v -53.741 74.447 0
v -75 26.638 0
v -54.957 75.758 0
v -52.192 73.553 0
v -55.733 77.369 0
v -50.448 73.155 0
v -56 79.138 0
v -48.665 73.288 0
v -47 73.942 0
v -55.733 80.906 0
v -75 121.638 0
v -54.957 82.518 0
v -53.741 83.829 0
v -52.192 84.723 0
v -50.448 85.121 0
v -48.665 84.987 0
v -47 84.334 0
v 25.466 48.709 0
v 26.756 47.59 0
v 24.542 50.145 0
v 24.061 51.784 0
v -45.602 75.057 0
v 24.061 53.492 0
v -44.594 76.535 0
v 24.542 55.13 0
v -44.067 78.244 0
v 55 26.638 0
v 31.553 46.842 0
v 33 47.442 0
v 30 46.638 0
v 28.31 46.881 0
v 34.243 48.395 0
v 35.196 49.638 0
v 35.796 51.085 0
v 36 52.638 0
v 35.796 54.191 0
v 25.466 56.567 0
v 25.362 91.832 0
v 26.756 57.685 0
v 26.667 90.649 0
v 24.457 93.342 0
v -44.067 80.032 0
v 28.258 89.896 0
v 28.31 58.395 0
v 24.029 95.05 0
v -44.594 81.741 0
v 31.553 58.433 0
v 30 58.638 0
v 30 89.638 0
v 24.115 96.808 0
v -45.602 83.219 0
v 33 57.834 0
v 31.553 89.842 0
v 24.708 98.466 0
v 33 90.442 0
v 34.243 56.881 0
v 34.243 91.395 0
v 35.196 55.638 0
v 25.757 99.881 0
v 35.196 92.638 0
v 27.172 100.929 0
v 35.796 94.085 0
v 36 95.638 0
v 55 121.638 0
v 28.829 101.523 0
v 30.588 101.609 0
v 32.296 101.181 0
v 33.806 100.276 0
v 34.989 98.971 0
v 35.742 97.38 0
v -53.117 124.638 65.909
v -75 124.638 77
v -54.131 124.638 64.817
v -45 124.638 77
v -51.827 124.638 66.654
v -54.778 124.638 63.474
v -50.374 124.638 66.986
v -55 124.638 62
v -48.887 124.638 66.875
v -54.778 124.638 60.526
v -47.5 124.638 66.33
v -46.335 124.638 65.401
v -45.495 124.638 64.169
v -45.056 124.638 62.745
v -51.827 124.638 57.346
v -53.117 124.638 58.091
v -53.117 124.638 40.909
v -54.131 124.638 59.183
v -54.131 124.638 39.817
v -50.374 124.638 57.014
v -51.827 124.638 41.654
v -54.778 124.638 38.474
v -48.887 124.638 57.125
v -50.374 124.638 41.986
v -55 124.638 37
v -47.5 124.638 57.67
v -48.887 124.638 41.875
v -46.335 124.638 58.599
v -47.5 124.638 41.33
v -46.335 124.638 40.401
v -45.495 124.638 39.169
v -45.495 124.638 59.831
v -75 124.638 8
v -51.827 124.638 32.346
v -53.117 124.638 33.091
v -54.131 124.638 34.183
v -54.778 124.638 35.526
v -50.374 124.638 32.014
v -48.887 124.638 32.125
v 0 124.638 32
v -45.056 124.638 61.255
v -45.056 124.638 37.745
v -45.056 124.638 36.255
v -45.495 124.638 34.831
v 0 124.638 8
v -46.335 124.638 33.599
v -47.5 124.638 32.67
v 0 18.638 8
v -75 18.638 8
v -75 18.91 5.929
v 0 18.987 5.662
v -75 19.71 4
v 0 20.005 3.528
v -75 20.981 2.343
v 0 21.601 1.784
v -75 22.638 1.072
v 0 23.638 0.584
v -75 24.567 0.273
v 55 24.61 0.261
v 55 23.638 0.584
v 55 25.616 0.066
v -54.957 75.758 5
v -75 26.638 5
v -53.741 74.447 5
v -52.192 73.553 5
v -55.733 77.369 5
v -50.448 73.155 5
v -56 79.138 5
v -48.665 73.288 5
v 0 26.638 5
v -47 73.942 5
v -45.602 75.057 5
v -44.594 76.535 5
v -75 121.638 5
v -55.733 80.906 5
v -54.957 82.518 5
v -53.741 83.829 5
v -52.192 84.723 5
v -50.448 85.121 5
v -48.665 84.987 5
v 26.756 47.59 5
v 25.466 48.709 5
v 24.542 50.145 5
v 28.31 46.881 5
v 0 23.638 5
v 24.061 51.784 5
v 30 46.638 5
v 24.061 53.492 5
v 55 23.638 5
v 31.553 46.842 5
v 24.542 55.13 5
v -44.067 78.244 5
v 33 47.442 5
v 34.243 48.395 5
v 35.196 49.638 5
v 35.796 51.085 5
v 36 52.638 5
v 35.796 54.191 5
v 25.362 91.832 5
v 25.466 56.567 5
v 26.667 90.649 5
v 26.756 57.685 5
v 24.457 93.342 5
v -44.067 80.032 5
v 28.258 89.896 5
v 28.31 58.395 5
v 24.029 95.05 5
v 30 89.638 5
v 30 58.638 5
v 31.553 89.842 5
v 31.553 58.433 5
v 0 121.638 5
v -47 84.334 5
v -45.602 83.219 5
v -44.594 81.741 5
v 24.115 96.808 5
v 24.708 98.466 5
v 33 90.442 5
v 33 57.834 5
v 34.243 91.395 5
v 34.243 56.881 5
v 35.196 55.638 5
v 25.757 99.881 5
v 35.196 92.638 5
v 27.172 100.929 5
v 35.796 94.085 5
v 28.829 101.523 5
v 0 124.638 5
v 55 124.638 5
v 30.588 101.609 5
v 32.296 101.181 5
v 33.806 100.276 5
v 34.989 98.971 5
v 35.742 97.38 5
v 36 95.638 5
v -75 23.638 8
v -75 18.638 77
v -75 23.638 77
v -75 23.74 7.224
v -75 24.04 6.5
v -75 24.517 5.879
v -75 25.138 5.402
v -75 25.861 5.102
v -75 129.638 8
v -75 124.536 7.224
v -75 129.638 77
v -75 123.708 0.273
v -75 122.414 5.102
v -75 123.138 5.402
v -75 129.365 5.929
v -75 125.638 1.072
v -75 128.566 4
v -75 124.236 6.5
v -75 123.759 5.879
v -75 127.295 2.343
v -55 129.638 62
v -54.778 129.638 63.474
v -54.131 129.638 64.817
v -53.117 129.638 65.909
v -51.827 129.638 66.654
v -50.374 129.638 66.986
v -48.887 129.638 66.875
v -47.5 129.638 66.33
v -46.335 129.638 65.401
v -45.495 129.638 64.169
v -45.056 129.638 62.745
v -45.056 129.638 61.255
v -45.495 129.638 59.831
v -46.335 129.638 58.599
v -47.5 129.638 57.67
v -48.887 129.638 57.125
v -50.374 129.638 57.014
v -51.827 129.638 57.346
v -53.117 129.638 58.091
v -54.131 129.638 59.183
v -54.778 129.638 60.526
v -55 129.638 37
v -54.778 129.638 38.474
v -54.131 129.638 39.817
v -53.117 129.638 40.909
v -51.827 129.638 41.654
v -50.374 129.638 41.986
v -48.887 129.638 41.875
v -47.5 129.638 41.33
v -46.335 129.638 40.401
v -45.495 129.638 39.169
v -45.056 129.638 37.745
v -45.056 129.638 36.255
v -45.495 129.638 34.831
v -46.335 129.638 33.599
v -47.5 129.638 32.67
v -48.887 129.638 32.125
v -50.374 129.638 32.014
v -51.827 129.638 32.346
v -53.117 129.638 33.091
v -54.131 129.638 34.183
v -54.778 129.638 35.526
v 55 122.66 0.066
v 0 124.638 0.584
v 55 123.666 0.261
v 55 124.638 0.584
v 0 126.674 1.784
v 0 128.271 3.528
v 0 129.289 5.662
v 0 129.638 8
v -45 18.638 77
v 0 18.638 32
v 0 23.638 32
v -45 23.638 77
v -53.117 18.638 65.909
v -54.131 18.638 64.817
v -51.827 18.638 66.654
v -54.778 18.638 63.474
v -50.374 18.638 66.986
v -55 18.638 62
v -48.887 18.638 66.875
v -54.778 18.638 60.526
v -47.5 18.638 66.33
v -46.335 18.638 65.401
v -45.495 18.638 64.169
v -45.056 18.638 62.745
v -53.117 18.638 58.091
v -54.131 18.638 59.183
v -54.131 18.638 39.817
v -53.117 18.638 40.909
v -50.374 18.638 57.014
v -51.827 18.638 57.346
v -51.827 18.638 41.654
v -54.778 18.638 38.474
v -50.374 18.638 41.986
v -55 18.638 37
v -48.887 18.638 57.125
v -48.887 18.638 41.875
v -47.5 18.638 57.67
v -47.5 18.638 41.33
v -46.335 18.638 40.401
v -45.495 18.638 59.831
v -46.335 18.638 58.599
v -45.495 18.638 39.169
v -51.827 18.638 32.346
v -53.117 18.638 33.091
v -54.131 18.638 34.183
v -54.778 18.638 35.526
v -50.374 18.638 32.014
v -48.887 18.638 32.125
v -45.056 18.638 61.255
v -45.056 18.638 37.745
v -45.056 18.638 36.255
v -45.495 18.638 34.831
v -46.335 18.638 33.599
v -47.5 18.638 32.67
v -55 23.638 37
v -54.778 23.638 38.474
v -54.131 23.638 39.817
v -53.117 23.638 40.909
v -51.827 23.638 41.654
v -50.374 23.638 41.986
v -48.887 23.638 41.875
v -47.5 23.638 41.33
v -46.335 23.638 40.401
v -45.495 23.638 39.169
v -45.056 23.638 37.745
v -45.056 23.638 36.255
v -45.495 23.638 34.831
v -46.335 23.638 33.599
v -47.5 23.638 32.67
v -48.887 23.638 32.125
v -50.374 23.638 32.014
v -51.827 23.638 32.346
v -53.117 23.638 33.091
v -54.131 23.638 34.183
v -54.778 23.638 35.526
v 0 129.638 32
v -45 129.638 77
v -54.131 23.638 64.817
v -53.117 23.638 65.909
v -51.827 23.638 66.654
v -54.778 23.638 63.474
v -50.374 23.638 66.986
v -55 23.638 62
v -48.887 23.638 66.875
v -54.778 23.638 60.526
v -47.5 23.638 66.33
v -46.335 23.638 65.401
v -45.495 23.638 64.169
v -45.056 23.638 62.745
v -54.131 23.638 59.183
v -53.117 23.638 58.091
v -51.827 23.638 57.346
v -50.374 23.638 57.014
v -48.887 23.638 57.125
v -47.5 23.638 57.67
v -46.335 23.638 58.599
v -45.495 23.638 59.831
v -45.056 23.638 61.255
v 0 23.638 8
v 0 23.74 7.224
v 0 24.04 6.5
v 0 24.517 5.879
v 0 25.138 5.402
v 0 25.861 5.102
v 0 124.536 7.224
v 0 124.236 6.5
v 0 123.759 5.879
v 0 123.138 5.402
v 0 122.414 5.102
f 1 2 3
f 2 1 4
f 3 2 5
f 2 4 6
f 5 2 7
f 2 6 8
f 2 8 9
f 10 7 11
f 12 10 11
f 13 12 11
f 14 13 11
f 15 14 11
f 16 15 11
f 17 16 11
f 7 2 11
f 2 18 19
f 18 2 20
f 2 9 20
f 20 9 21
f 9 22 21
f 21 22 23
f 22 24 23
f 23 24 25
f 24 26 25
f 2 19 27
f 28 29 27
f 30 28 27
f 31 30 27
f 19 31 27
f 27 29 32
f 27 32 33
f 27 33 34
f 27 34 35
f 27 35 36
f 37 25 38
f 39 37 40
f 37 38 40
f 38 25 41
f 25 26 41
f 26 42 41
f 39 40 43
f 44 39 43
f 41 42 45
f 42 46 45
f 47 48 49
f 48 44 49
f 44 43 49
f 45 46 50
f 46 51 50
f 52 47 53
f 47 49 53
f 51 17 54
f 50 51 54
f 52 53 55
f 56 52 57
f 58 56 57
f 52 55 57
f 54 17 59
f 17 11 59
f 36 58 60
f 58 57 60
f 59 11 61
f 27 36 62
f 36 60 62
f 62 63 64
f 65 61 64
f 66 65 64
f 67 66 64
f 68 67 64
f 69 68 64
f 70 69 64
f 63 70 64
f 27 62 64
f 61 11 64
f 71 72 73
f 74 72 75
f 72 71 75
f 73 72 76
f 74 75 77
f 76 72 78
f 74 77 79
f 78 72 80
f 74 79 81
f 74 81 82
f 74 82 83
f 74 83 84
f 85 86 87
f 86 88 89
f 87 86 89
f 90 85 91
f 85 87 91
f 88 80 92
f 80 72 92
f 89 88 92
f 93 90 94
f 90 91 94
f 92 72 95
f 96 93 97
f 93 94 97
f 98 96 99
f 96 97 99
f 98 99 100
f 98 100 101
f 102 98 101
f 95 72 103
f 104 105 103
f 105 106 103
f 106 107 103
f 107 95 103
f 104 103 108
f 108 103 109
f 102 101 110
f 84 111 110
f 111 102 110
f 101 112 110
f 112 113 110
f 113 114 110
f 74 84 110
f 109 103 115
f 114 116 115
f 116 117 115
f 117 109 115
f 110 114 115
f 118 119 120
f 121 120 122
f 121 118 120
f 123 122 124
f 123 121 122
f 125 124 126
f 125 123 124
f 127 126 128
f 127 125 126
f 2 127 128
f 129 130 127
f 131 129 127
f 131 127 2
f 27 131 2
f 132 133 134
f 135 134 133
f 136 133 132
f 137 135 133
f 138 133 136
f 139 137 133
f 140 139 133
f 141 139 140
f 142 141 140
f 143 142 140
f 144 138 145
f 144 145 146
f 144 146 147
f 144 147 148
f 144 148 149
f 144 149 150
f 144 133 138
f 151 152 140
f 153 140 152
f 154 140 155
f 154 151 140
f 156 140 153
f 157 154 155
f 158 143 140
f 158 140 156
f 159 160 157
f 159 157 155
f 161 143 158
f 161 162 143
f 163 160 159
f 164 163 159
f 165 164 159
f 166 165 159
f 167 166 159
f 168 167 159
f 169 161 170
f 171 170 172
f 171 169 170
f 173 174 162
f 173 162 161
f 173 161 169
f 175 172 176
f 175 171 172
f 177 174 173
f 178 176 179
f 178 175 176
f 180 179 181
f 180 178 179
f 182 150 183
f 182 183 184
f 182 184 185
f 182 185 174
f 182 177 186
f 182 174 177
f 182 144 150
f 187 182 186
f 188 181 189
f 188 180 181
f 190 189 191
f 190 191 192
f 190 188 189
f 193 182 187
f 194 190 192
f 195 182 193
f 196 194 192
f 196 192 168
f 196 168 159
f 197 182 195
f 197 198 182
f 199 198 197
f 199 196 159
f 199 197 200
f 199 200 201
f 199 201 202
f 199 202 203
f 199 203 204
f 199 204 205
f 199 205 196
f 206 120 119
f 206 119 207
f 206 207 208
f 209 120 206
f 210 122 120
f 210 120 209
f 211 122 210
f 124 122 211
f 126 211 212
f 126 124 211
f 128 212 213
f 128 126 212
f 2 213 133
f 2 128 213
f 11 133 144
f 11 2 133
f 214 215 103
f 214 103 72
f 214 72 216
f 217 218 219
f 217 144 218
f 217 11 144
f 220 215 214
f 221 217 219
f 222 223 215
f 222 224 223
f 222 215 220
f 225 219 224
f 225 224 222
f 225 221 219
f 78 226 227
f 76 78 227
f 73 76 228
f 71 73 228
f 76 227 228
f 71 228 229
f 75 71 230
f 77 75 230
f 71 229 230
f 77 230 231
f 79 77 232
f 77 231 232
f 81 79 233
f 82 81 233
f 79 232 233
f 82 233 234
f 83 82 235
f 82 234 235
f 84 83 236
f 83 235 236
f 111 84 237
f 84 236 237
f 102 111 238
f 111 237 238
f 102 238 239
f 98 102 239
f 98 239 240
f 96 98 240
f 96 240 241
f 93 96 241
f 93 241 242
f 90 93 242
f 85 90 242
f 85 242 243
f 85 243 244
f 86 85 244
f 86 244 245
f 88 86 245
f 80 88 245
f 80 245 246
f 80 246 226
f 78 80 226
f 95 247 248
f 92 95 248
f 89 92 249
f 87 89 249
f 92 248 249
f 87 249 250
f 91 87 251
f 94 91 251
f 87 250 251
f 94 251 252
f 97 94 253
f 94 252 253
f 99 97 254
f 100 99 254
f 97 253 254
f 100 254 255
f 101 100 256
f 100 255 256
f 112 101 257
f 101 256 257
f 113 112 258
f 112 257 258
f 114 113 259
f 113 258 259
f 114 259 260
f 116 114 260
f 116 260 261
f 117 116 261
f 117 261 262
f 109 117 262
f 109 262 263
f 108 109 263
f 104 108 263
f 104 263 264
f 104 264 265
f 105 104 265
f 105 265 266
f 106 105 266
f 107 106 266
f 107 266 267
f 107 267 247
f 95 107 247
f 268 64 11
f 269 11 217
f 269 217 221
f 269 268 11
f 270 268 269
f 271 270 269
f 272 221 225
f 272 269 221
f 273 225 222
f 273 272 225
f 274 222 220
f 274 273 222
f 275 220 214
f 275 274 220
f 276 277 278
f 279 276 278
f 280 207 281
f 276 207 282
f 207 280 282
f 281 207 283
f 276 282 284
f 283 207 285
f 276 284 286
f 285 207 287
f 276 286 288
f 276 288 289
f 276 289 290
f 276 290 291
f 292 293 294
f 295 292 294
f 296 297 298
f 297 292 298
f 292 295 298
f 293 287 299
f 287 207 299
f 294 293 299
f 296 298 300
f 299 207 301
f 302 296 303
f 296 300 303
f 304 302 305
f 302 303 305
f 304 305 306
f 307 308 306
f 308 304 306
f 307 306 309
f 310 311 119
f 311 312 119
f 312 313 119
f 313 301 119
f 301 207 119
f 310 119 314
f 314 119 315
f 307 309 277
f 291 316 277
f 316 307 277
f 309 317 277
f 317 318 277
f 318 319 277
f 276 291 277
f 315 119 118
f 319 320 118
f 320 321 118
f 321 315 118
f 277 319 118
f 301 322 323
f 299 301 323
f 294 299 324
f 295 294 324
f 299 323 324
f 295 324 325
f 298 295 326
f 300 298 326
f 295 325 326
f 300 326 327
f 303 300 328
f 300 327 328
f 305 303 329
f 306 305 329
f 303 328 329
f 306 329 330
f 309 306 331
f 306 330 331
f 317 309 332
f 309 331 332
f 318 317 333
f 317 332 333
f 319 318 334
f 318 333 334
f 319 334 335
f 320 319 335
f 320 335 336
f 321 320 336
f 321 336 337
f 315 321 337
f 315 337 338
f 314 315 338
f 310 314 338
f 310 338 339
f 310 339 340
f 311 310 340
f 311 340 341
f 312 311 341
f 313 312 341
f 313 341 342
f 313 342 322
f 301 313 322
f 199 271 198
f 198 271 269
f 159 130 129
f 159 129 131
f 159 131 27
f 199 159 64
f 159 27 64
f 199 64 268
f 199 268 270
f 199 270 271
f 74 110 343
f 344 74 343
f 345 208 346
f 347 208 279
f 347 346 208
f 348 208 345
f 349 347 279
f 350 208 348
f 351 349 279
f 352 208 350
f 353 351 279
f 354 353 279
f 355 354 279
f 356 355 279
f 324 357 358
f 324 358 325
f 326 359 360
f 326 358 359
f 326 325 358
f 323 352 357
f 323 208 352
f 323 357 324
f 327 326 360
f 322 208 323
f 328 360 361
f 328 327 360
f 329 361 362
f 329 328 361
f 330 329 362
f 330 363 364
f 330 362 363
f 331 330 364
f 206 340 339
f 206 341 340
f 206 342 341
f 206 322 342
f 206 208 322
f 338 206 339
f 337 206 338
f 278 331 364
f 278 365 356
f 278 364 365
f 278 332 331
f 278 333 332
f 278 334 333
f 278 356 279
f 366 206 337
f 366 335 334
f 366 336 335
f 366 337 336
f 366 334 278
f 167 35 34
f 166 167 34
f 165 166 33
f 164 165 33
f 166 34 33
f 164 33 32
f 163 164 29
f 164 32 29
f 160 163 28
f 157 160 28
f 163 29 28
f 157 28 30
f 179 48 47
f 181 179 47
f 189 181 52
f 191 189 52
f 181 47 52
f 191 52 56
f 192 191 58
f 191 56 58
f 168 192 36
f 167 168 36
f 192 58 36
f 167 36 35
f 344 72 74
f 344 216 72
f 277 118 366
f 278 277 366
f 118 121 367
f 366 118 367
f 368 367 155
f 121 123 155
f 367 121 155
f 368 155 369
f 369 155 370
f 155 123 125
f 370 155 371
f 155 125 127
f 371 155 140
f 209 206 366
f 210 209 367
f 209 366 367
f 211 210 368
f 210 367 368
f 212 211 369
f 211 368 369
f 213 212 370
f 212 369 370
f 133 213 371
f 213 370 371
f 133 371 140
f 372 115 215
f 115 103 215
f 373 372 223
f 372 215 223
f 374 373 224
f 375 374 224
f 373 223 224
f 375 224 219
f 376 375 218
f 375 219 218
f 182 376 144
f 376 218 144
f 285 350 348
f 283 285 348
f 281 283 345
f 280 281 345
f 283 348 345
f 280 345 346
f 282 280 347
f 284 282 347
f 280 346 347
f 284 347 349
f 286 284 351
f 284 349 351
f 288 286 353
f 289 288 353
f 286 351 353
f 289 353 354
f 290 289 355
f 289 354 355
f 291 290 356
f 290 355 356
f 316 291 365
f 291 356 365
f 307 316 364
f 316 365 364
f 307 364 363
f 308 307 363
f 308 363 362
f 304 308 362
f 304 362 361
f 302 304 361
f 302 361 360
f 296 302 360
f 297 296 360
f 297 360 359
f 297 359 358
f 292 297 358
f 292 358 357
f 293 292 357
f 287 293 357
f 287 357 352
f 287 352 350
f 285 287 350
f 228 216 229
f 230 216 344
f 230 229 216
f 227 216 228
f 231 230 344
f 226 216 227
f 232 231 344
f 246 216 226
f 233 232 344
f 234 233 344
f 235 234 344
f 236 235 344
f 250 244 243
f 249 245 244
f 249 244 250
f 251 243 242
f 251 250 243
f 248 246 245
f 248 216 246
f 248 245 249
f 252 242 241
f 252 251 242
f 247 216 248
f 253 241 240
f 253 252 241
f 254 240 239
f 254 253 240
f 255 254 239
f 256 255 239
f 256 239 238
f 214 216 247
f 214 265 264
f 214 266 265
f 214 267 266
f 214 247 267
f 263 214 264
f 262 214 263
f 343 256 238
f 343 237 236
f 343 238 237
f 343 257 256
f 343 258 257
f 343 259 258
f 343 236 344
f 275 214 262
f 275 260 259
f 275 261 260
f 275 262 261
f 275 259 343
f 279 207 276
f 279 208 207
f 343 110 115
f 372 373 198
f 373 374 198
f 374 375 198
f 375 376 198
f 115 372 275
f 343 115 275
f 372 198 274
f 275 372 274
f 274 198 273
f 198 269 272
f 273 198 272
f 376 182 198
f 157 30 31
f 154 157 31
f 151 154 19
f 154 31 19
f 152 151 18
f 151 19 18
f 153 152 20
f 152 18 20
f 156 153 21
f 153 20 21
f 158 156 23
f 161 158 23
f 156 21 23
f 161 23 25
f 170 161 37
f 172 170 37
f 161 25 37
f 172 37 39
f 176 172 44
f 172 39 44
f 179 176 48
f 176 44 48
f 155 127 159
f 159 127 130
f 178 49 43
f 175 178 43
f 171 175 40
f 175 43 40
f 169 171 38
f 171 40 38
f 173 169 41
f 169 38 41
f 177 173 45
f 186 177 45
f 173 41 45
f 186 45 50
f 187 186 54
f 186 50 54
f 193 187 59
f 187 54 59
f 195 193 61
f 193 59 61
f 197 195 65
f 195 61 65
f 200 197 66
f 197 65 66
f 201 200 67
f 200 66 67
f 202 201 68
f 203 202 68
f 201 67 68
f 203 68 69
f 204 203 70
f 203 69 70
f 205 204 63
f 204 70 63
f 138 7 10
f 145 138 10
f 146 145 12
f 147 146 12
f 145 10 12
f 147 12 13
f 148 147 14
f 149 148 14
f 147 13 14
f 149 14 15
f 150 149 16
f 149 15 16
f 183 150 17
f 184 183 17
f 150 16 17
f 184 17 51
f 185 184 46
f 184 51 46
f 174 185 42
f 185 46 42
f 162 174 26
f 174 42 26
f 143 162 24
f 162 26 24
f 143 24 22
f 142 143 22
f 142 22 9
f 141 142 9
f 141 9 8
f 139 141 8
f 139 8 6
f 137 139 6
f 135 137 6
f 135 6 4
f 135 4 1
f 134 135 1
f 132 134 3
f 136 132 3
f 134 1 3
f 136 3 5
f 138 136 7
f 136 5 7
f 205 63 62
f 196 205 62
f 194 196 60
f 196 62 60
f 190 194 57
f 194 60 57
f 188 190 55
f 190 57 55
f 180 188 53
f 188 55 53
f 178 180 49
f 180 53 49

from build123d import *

# Parameters (mm, degrees)
F1_DEPTH = 5
F0_W     = 75
F0_H     = 5
F2_DEPTH = 77
F3_SIZE  = 45
F4_SIZE  = 45
F5_R     = 3
F6_R     = 8
F8_D     = 10
F9_D     = 10


with BuildPart() as f1:
    # F0 (on Top) → F1 (new body)
    with BuildSketch(Plane.XY):
        Polygon((30, 23.6378825456), (55, 23.6378825456), (55, 124.6378825456), (0, 124.6378825456), (-75, 124.6378825456), (-75, 79.1378825456), (-75, 23.6378825456), (0, 23.6378825456), align=None)
        with BuildLine():
            ThreePointArc((36, 52.6378825456), (34.2426406871, 48.3952418585), (30, 46.6378825456))
            ThreePointArc((30, 46.6378825456), (24, 52.6378825456), (30, 58.6378825456))
            ThreePointArc((30, 58.6378825456), (34.2426406871, 56.8805232327), (36, 52.6378825456))
        make_face(mode=Mode.SUBTRACT)
        with BuildLine():
            ThreePointArc((-44, 79.1378825456), (-50, 73.1378825456), (-56, 79.1378825456))
            ThreePointArc((-56, 79.1378825456), (-50, 85.1378825456), (-44, 79.1378825456))
        make_face(mode=Mode.SUBTRACT)
        with BuildLine():
            ThreePointArc((36, 95.6378825456), (34.2426406871, 91.3952418585), (30, 89.6378825456))
            ThreePointArc((30, 89.6378825456), (25.7573593129, 99.8805232327), (36, 95.6378825456))
        make_face(mode=Mode.SUBTRACT)
    extrude(amount=F1_DEPTH)

    # F0 (on Top) → F2 (join)
    with BuildSketch(Plane.XY):
        with Locations((-37.5, 127.1378825456)):
            Rectangle(F0_W, F0_H)
        with Locations((-37.5, 21.1378825456)):
            Rectangle(F0_W, F0_H)
    extrude(amount=F2_DEPTH)

    # F3
    f3_edges = [f1.edges().sort_by_distance(p)[0] for p in [
        (0, 127.137883, 77),
    ]]
    chamfer(f3_edges, length=F3_SIZE)

    # F4
    f4_edges = [f1.edges().sort_by_distance(p)[0] for p in [
        (0, 21.137883, 77),
    ]]
    chamfer(f4_edges, length=F4_SIZE)

    # F5
    f5_edges = [f1.edges().sort_by_distance(p)[0] for p in [
        (-37.5, 124.637883, 5),
        (-37.5, 23.637883, 5),
    ]]
    fillet(f5_edges, radius=F5_R)

    # F6
    f6_edges = [f1.edges().sort_by_distance(p)[0] for p in [
        (-37.5, 18.637883, 0),
        (-37.5, 129.637883, 0),
    ]]
    fillet(f6_edges, radius=F6_R)

    # F8 (through all)
    with Locations(Plane.XZ.offset(-18.6378825456)):
        with Locations((-50, 37)):
            Hole(F8_D / 2)

    # F9 (through all)
    with Locations(Plane.XZ.offset(-18.6378825456)):
        with Locations((-50, 62)):
            Hole(F9_D / 2)


solid = f1.part
